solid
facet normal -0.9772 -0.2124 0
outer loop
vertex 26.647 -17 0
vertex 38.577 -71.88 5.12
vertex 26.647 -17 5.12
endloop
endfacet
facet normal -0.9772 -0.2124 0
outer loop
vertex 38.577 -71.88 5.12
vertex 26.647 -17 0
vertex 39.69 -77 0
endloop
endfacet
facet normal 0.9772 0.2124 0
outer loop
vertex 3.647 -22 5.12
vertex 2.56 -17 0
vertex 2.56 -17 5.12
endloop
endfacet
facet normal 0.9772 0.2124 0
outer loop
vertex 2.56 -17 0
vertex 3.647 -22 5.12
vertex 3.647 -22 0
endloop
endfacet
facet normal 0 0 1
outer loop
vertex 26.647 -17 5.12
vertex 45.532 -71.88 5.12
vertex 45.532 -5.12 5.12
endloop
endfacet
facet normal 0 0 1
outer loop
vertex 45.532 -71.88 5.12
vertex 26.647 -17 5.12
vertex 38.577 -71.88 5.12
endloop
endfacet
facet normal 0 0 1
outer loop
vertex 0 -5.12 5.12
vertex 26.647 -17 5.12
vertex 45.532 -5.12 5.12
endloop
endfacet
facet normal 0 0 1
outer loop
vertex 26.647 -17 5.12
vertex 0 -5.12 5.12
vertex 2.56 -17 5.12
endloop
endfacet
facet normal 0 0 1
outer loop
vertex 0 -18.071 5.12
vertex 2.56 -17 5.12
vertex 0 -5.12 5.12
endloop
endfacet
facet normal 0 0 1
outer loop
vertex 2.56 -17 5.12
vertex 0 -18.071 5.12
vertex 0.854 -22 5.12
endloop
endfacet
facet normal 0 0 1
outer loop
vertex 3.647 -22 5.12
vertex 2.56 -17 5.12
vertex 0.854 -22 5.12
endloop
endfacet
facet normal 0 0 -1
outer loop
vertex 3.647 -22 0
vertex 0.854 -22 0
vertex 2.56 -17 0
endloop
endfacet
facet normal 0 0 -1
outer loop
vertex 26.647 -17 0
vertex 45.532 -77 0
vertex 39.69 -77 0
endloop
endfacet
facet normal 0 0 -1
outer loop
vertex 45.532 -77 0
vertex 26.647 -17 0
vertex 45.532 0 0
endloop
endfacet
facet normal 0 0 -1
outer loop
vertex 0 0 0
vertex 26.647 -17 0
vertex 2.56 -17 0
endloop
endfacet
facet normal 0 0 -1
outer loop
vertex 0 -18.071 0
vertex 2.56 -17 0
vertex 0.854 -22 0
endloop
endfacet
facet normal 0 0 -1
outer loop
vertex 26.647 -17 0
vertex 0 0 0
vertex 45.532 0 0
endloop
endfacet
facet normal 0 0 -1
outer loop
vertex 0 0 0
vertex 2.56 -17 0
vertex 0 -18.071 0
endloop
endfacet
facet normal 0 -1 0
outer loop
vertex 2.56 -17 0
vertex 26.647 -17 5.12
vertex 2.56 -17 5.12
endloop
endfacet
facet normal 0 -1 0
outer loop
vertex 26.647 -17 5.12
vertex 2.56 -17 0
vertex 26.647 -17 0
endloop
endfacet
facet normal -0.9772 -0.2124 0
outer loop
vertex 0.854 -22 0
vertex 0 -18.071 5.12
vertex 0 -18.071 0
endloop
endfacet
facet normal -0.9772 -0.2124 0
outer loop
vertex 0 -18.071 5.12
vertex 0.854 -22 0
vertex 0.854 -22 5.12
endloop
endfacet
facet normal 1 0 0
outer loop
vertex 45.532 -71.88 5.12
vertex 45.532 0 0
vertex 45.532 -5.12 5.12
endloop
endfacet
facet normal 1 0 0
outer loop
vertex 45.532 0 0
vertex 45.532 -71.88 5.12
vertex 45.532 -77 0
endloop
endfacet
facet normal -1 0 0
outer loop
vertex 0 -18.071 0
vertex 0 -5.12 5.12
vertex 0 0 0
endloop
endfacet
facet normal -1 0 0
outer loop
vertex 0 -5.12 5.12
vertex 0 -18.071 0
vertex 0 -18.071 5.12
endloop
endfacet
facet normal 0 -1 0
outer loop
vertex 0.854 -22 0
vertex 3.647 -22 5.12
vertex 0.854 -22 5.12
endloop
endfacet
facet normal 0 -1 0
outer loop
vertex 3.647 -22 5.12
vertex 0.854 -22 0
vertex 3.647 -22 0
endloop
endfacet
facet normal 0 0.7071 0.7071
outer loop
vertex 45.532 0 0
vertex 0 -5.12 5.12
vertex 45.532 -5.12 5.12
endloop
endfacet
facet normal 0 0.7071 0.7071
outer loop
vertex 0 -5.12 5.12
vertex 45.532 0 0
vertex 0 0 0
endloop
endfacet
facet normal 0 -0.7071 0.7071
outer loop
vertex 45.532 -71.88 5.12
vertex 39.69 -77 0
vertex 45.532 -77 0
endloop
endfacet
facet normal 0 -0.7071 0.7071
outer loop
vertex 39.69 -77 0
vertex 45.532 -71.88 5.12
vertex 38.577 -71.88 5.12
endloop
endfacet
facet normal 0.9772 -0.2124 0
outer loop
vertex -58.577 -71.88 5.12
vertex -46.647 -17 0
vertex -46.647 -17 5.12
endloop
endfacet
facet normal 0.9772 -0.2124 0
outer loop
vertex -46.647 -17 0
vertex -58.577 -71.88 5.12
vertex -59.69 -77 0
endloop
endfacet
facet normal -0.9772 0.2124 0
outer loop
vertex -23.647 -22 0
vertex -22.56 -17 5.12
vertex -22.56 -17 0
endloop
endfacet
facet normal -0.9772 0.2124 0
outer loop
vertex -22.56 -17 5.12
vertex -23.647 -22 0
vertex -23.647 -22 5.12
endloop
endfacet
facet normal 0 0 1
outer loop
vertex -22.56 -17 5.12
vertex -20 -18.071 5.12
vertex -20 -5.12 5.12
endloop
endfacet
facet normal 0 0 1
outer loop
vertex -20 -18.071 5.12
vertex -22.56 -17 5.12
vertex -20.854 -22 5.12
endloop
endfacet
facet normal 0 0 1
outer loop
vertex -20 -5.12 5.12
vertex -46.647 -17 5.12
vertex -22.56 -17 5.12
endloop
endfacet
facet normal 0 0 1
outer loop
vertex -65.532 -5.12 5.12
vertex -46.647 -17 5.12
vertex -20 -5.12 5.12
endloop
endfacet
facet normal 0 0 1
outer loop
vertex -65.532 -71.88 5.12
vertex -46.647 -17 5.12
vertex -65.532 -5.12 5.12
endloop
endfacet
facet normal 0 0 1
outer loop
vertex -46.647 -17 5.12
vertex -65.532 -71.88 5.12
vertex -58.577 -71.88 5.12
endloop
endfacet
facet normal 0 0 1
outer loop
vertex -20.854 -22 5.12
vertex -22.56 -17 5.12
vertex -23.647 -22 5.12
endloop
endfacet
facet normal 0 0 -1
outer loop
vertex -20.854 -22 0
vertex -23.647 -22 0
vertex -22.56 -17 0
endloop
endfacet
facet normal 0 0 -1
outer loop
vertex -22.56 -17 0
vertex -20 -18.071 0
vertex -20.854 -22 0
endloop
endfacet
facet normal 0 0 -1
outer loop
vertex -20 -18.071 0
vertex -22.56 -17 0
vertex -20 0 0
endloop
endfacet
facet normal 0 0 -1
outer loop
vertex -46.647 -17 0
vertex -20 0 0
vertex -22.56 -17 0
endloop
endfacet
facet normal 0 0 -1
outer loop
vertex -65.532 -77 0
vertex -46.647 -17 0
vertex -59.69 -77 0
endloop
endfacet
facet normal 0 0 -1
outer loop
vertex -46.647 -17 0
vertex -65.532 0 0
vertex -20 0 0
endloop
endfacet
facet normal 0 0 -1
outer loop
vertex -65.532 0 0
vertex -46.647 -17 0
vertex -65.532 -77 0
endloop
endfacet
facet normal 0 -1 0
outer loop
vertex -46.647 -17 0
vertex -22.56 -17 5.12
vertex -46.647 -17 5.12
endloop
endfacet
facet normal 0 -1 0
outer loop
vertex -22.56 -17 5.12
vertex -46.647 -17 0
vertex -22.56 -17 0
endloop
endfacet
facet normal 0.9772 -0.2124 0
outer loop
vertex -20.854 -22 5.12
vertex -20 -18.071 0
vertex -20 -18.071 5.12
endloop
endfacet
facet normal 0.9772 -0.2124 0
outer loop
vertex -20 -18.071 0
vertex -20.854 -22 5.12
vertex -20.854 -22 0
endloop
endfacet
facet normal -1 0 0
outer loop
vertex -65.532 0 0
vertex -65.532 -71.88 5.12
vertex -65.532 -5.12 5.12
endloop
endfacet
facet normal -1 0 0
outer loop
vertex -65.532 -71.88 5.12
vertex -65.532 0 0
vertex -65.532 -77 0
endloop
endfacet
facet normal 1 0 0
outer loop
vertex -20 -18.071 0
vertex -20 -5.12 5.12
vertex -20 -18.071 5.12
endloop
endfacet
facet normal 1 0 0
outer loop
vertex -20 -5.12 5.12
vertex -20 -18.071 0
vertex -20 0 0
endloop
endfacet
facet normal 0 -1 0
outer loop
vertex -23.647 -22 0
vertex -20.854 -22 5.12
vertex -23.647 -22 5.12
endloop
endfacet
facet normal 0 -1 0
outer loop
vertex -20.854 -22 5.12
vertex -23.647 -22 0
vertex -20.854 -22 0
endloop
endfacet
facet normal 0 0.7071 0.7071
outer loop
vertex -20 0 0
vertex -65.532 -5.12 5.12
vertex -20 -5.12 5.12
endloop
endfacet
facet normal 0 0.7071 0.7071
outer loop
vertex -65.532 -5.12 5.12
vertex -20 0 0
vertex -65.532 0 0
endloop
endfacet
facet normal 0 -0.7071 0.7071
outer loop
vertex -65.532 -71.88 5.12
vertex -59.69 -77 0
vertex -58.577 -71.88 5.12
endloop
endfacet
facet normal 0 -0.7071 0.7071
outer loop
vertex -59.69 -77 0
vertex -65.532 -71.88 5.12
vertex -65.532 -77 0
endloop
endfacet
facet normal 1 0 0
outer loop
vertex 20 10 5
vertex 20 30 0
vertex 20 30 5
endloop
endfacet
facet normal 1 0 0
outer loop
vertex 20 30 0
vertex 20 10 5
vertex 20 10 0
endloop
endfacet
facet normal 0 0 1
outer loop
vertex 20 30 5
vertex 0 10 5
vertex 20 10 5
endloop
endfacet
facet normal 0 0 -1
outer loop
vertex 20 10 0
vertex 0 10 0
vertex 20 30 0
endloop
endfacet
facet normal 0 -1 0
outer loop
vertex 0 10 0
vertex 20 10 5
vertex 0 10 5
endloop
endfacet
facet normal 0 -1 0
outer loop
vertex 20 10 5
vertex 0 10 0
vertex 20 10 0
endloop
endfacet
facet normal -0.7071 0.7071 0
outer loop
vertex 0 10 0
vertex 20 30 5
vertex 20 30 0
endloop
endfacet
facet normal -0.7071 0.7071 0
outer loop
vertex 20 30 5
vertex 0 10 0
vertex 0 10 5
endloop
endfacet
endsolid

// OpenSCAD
// Curve Clock
// Inspired by Structure Clock http://www.thingiverse.com/thing:557190
// CC BY-SA 3.0 Tom Øyvind Hogstad 2014-15

// Sources:
// Peano-Gosper Curve http://hiiragicompany.net/ls.html
// Hilbert Curve http://upload.wikimedia.org/wikipedia/en/a/a5/Hilbert_curve.svg
// Escher Lizard http://www.inkscapeforum.com/viewtopic.php?f=5&t=2856


use <utility.scad>
//use <hilbert.scad>
//use <escher_lizard.scad>
use <gosper.scad>

r1 = 80;
r2 = 85;
layer  = 0.3; 
solid_layers = 3;
nozzle = 0.4;
// Perimeters - slic3r tend to change this around between versions
e_perimeters_ew = nozzle;
//perimeter_ew = 0.67;    	// lh=0.2
perimeters_ew = 0.48; 		// lh=0.3
wall = 2*e_perimeters_ew+perimeters_ew; // Going for "3" perimeters width.
rim = wall*4;
mech = [56,56,17];
mech_padded = mech + [2,2,1];
mech_box = mech_padded + [2*wall,2*wall, layer*3];
center_r = 5;
center_h = 5;
h  = mech_padded[2]+center_h;
dr = r2-r1;
c  = hypotenuse(h,dr);
_t = asin(dr/c);
_a = 90-_t;
s = sin(_t) * r1;

sr = 60;
sl = hypotenuse(sr,sr);
ss = sagitta(r1,sl/2);
fl = round(hypotenuse(ss,ss));
//fl=24;
echo("wall: ", wall);
echo("dr: ", dr);
echo("c: ", c);
echo("_t: ", _t);
echo("_a: ", _a);
echo("s: ", s);

echo("sl: ", sl);
echo("ss: ", ss);
echo("fl: ", fl);


 
//assembled();
//print();
stand_print();


module stand_print() {
translateX(-20) mirror()
rotateX(90)
stand();

rotateX(90)
stand();

translateY(10) 
difference() {
	cube([20,20,5]);
	rotateZ(45) cube([30,30,5]);
	
}

}

module stand_cut() {
	difference() {
		rotateY(_t) cube([c,4*wall,sr+fl]);
		translateZ(-10) cube([c*2,4*wall,10]);
	}
}

module stand() {
	difference() {
		cube([c+s+5, 4*wall, sr+fl]);
		translate([0,0,fl+5]) cube([c,4*wall,sr+fl]);
		//translate([2*wall,0,fl]) cube([c,2*wall,sr+fl]);
		#translate([2*wall,0,fl]) stand_cut();
		rotateX(-45) cube([c+s+5, 10, 10]);
		translateZ(sr+fl) rotateX(-45) cube([c+s+5, 10, 10]);
		//translate([5,0,7.5]) cube([c+s-5,2*wall, fl-15]);
		#translate([-c-1,0,fl-1]) stand_cut();

	}


}


module assembled() {
	body();
} 

module print() {
	body(print=true);
}





module body(print=false) {
	difference() {
		union() {
			difference() {
				cylinder(r1=poly(r1, 240), r2=poly(r2,240), h=h, $fn=240);
				translateZ(-1) cylinder(r1=poly(r1-rim, 240), r2=poly(r2-rim,240), h=h+2, $fn=240);
			}
			intersection() {
				translateZ(-1) cylinder(r1=poly(r1-1, 240), r2=poly(r2-1,240), h=h+2, $fn=240);
				scale([wall,wall,1]) curve(h);
			}
			cube_centered(mech_box);
			cylinder(r=poly(center_r+wall,32), h=h, $fn=32);
		}
		body_holes(print);
	}
}

module body_holes(print=false) {
	translateZ(-layer) cube_centered(mech_padded);
	#translateZ(mech_padded[2]) cylinder(r=poly(center_r,32), h=h, $fn=32);

}
